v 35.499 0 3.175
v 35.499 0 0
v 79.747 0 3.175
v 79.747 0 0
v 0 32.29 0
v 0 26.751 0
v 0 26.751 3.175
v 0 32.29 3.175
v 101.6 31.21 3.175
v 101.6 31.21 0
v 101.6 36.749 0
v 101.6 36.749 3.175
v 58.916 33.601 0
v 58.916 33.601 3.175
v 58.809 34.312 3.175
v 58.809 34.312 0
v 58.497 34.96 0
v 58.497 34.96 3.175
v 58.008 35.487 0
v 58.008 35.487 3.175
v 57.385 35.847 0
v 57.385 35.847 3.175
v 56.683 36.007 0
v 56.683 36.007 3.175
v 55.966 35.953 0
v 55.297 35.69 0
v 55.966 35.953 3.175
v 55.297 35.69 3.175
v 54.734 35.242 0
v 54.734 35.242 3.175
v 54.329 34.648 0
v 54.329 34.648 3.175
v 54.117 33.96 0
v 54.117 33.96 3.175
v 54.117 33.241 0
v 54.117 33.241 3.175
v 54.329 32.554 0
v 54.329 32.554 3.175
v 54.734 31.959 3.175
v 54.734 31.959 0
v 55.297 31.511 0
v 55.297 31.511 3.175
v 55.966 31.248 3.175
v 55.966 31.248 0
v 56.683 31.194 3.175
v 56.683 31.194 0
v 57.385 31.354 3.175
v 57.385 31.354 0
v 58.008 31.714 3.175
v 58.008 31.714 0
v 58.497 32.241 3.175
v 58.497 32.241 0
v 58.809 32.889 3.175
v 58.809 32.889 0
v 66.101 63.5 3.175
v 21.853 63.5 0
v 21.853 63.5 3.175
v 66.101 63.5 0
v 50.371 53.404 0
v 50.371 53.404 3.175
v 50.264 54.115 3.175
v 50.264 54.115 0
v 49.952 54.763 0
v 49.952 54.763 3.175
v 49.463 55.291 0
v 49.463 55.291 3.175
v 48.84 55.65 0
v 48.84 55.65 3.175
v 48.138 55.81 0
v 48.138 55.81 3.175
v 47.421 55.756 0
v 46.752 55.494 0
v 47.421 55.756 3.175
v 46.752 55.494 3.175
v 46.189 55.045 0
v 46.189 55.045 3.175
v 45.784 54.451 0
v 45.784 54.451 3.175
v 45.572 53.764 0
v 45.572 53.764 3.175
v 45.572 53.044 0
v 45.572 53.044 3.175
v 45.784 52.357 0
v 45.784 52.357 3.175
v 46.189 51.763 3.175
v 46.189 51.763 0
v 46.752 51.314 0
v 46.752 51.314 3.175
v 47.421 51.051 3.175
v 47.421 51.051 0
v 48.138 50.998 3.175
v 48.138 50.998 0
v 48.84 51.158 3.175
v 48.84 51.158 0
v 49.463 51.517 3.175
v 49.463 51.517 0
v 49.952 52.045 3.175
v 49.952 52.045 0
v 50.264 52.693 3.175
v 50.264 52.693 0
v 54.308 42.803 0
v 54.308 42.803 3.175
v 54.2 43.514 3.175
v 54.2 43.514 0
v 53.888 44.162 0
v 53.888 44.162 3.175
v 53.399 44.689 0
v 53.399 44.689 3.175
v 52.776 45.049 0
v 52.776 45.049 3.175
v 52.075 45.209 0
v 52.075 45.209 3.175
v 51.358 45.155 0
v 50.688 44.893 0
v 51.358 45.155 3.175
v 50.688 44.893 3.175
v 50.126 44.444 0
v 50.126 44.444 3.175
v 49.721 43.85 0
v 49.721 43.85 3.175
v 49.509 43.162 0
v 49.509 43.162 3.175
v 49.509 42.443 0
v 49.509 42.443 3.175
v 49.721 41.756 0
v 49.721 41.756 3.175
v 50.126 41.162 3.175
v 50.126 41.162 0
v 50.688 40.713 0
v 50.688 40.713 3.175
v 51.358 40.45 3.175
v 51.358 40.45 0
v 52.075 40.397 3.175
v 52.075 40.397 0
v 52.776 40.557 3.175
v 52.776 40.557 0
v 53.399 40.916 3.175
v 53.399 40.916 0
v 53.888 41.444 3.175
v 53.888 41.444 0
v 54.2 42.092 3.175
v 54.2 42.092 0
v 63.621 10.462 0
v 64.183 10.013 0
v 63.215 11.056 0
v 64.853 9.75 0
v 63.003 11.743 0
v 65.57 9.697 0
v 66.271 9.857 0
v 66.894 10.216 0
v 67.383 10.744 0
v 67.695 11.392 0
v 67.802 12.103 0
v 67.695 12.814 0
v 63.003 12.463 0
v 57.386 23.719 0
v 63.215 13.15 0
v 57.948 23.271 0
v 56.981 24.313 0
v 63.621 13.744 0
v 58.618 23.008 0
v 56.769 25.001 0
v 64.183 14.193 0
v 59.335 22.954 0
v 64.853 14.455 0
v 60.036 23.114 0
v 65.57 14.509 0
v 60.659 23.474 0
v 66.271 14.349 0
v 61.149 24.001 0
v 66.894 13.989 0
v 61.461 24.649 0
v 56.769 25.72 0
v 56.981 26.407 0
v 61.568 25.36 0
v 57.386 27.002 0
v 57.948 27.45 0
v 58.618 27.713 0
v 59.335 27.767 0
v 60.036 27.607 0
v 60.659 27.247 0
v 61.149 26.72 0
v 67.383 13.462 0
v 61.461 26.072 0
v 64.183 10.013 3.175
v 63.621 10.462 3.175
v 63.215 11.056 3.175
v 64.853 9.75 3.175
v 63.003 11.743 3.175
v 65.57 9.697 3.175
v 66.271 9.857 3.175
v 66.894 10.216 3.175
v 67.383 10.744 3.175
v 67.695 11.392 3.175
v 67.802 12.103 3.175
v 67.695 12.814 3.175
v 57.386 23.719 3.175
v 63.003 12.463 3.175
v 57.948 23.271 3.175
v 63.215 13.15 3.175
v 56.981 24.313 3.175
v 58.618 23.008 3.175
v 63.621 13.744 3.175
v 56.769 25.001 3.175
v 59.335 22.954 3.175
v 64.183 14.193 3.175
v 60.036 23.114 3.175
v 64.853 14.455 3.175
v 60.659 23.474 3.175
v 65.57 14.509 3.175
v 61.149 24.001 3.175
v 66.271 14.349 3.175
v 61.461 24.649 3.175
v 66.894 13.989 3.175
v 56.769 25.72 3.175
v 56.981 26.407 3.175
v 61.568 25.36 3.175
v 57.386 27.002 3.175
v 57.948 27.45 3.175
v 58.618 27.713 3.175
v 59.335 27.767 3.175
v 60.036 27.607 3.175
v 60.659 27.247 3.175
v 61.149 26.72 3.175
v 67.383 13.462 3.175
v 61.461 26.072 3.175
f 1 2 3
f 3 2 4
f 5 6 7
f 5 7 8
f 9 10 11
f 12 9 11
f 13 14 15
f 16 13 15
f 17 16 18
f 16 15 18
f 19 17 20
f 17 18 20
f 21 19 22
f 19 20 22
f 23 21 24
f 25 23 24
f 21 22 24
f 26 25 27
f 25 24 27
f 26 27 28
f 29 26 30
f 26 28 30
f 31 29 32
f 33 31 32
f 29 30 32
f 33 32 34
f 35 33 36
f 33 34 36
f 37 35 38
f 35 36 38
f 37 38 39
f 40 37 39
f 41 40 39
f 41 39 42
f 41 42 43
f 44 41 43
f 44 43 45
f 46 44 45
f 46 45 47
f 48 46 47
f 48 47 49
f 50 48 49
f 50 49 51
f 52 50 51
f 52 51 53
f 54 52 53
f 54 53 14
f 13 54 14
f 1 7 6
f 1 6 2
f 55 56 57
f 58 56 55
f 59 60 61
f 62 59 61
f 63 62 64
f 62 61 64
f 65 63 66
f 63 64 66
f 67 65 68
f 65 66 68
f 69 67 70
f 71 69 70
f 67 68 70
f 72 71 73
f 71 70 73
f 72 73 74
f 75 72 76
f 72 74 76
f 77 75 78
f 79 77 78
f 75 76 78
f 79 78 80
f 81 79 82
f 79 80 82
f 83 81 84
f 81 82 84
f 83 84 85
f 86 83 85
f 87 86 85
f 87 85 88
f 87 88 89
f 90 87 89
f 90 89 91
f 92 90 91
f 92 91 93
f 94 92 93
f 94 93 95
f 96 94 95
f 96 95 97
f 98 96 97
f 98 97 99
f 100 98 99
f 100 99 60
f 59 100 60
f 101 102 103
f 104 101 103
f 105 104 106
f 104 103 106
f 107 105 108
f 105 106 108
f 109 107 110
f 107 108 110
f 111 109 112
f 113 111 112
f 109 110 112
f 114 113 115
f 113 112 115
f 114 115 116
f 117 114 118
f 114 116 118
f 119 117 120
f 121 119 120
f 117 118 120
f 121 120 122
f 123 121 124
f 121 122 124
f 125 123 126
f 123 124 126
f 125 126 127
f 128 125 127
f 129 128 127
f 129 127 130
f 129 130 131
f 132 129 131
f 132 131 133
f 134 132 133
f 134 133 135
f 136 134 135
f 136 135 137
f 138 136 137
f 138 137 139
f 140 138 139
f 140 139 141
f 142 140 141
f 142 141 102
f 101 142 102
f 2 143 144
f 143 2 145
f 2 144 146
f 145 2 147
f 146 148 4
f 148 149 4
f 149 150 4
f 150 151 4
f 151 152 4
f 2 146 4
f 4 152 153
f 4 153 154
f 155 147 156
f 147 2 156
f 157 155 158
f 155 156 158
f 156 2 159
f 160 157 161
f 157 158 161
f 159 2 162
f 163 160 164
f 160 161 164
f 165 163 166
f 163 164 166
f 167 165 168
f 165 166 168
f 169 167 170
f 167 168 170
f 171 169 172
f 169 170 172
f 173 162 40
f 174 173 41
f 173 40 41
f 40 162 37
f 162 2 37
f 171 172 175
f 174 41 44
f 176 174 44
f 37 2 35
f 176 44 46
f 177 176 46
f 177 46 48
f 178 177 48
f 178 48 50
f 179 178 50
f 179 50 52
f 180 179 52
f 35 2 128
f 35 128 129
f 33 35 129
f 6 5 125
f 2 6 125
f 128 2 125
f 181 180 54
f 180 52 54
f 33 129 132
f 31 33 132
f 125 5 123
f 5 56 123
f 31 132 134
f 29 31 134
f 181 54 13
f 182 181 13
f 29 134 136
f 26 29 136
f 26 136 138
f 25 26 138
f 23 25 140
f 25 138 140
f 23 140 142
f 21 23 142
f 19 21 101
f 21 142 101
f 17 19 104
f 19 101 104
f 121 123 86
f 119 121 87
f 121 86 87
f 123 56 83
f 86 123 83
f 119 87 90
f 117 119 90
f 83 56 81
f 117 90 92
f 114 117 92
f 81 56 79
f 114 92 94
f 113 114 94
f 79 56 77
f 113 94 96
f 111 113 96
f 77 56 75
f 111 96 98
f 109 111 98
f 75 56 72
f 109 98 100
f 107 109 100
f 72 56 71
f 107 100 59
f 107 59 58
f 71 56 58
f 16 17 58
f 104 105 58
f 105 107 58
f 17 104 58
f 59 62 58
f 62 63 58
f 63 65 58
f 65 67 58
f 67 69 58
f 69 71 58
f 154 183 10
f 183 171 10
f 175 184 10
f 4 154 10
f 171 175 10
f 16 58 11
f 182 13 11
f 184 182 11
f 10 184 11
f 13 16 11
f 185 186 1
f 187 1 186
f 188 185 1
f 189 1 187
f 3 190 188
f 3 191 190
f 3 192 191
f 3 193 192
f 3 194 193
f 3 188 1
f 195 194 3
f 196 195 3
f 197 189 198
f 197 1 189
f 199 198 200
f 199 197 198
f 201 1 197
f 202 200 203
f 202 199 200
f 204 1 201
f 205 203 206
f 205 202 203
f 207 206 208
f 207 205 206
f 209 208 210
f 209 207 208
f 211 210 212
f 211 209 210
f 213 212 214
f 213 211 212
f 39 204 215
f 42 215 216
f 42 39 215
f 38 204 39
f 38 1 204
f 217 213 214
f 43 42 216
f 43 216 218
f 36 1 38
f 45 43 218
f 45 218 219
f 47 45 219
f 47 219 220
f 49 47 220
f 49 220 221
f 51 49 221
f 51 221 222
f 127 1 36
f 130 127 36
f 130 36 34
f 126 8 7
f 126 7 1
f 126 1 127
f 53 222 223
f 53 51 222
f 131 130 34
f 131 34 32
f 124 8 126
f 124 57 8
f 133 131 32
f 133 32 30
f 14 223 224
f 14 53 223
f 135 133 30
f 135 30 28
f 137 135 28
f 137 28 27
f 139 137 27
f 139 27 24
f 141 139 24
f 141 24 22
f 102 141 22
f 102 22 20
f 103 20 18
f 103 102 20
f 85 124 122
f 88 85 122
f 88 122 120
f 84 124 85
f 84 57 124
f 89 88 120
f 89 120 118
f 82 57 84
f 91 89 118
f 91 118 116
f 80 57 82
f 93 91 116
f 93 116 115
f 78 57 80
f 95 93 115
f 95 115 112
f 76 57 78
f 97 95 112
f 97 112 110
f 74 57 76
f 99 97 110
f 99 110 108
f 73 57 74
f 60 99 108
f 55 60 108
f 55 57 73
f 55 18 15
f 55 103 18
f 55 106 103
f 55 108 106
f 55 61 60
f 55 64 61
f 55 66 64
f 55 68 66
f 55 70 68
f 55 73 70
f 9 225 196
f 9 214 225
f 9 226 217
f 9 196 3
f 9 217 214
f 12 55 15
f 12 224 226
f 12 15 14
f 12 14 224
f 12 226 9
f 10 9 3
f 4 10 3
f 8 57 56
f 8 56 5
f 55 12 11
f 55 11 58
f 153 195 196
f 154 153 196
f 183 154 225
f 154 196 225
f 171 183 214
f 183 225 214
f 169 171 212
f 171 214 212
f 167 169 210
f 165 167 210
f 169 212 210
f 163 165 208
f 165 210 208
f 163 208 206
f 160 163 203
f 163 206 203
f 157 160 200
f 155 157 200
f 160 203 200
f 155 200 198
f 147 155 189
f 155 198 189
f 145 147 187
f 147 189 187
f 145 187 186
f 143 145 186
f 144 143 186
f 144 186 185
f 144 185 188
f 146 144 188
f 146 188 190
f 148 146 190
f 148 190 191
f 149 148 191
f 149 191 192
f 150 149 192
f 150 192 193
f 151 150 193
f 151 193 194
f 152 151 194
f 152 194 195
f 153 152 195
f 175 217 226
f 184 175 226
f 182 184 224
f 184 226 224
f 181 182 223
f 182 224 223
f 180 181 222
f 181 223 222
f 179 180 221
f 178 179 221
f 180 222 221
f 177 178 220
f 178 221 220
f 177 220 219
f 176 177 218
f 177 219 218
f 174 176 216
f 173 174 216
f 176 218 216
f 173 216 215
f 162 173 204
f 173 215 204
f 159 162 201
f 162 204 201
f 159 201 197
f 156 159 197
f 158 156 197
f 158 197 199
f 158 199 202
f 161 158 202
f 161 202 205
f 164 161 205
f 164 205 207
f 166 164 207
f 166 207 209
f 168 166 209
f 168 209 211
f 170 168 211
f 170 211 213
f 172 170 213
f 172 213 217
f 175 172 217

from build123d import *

# Parameters (mm, degrees)
SKETCH1_W           = 101.6
SKETCH1_H           = 63.5
BOSS_EXTRUDE1_DEPTH = 3.175
CUT_EXTRUDE1_DEPTH  = 120.85362166
CUT_EXTRUDE2_DEPTH  = 120.85362166
SKETCH5_R           = 2.413
CUT_EXTRUDE3_DEPTH  = 120.85362166


with BuildPart() as part:
    # Sketch1 → Boss-Extrude1 (new body)
    with BuildSketch(Plane.XY):
        with Locations((50.8, 31.75)):
            Rectangle(SKETCH1_W, SKETCH1_H)
    extrude(amount=BOSS_EXTRUDE1_DEPTH)

    # Sketch2 → Cut-Extrude1 (cut, through all)
    with BuildSketch(Plane.XY.offset(3.175)):
        Polygon((101.6, 31.209692887), (79.746737775, 0), (101.6, 0), align=None)
        Polygon((101.6, 36.749322221), (66.100651578, 63.5), (101.6, 63.5), align=None)
    extrude(amount=-CUT_EXTRUDE1_DEPTH, mode=Mode.SUBTRACT)

    # Sketch3 → Cut-Extrude2 (cut, through all)
    with BuildSketch(Plane.XY.offset(3.175)):
        Polygon((21.853262225, 63.5), (0, 32.290307113), (0, 63.5), align=None)
        Polygon((0, 0), (0, 26.750677779), (35.499348422, 0), align=None)
    extrude(amount=-CUT_EXTRUDE2_DEPTH, mode=Mode.SUBTRACT)

    # Sketch5 → Cut-Extrude3 (cut, through all)
    with BuildSketch(Plane.XY.offset(3.175)):
        with Locations((47.958119633, 53.403997063)):
            Circle(SKETCH5_R)
        with Locations((51.894556786, 42.802795542)):
            Circle(SKETCH5_R)
        with Locations((59.154907323, 25.360400118)):
            Circle(SKETCH5_R)
        with Locations((65.389464521, 12.10291712)):
            Circle(SKETCH5_R)
        with Locations((56.503056774, 33.600657948)):
            Circle(SKETCH5_R)
    extrude(amount=-CUT_EXTRUDE3_DEPTH, mode=Mode.SUBTRACT)


solid = part.part
